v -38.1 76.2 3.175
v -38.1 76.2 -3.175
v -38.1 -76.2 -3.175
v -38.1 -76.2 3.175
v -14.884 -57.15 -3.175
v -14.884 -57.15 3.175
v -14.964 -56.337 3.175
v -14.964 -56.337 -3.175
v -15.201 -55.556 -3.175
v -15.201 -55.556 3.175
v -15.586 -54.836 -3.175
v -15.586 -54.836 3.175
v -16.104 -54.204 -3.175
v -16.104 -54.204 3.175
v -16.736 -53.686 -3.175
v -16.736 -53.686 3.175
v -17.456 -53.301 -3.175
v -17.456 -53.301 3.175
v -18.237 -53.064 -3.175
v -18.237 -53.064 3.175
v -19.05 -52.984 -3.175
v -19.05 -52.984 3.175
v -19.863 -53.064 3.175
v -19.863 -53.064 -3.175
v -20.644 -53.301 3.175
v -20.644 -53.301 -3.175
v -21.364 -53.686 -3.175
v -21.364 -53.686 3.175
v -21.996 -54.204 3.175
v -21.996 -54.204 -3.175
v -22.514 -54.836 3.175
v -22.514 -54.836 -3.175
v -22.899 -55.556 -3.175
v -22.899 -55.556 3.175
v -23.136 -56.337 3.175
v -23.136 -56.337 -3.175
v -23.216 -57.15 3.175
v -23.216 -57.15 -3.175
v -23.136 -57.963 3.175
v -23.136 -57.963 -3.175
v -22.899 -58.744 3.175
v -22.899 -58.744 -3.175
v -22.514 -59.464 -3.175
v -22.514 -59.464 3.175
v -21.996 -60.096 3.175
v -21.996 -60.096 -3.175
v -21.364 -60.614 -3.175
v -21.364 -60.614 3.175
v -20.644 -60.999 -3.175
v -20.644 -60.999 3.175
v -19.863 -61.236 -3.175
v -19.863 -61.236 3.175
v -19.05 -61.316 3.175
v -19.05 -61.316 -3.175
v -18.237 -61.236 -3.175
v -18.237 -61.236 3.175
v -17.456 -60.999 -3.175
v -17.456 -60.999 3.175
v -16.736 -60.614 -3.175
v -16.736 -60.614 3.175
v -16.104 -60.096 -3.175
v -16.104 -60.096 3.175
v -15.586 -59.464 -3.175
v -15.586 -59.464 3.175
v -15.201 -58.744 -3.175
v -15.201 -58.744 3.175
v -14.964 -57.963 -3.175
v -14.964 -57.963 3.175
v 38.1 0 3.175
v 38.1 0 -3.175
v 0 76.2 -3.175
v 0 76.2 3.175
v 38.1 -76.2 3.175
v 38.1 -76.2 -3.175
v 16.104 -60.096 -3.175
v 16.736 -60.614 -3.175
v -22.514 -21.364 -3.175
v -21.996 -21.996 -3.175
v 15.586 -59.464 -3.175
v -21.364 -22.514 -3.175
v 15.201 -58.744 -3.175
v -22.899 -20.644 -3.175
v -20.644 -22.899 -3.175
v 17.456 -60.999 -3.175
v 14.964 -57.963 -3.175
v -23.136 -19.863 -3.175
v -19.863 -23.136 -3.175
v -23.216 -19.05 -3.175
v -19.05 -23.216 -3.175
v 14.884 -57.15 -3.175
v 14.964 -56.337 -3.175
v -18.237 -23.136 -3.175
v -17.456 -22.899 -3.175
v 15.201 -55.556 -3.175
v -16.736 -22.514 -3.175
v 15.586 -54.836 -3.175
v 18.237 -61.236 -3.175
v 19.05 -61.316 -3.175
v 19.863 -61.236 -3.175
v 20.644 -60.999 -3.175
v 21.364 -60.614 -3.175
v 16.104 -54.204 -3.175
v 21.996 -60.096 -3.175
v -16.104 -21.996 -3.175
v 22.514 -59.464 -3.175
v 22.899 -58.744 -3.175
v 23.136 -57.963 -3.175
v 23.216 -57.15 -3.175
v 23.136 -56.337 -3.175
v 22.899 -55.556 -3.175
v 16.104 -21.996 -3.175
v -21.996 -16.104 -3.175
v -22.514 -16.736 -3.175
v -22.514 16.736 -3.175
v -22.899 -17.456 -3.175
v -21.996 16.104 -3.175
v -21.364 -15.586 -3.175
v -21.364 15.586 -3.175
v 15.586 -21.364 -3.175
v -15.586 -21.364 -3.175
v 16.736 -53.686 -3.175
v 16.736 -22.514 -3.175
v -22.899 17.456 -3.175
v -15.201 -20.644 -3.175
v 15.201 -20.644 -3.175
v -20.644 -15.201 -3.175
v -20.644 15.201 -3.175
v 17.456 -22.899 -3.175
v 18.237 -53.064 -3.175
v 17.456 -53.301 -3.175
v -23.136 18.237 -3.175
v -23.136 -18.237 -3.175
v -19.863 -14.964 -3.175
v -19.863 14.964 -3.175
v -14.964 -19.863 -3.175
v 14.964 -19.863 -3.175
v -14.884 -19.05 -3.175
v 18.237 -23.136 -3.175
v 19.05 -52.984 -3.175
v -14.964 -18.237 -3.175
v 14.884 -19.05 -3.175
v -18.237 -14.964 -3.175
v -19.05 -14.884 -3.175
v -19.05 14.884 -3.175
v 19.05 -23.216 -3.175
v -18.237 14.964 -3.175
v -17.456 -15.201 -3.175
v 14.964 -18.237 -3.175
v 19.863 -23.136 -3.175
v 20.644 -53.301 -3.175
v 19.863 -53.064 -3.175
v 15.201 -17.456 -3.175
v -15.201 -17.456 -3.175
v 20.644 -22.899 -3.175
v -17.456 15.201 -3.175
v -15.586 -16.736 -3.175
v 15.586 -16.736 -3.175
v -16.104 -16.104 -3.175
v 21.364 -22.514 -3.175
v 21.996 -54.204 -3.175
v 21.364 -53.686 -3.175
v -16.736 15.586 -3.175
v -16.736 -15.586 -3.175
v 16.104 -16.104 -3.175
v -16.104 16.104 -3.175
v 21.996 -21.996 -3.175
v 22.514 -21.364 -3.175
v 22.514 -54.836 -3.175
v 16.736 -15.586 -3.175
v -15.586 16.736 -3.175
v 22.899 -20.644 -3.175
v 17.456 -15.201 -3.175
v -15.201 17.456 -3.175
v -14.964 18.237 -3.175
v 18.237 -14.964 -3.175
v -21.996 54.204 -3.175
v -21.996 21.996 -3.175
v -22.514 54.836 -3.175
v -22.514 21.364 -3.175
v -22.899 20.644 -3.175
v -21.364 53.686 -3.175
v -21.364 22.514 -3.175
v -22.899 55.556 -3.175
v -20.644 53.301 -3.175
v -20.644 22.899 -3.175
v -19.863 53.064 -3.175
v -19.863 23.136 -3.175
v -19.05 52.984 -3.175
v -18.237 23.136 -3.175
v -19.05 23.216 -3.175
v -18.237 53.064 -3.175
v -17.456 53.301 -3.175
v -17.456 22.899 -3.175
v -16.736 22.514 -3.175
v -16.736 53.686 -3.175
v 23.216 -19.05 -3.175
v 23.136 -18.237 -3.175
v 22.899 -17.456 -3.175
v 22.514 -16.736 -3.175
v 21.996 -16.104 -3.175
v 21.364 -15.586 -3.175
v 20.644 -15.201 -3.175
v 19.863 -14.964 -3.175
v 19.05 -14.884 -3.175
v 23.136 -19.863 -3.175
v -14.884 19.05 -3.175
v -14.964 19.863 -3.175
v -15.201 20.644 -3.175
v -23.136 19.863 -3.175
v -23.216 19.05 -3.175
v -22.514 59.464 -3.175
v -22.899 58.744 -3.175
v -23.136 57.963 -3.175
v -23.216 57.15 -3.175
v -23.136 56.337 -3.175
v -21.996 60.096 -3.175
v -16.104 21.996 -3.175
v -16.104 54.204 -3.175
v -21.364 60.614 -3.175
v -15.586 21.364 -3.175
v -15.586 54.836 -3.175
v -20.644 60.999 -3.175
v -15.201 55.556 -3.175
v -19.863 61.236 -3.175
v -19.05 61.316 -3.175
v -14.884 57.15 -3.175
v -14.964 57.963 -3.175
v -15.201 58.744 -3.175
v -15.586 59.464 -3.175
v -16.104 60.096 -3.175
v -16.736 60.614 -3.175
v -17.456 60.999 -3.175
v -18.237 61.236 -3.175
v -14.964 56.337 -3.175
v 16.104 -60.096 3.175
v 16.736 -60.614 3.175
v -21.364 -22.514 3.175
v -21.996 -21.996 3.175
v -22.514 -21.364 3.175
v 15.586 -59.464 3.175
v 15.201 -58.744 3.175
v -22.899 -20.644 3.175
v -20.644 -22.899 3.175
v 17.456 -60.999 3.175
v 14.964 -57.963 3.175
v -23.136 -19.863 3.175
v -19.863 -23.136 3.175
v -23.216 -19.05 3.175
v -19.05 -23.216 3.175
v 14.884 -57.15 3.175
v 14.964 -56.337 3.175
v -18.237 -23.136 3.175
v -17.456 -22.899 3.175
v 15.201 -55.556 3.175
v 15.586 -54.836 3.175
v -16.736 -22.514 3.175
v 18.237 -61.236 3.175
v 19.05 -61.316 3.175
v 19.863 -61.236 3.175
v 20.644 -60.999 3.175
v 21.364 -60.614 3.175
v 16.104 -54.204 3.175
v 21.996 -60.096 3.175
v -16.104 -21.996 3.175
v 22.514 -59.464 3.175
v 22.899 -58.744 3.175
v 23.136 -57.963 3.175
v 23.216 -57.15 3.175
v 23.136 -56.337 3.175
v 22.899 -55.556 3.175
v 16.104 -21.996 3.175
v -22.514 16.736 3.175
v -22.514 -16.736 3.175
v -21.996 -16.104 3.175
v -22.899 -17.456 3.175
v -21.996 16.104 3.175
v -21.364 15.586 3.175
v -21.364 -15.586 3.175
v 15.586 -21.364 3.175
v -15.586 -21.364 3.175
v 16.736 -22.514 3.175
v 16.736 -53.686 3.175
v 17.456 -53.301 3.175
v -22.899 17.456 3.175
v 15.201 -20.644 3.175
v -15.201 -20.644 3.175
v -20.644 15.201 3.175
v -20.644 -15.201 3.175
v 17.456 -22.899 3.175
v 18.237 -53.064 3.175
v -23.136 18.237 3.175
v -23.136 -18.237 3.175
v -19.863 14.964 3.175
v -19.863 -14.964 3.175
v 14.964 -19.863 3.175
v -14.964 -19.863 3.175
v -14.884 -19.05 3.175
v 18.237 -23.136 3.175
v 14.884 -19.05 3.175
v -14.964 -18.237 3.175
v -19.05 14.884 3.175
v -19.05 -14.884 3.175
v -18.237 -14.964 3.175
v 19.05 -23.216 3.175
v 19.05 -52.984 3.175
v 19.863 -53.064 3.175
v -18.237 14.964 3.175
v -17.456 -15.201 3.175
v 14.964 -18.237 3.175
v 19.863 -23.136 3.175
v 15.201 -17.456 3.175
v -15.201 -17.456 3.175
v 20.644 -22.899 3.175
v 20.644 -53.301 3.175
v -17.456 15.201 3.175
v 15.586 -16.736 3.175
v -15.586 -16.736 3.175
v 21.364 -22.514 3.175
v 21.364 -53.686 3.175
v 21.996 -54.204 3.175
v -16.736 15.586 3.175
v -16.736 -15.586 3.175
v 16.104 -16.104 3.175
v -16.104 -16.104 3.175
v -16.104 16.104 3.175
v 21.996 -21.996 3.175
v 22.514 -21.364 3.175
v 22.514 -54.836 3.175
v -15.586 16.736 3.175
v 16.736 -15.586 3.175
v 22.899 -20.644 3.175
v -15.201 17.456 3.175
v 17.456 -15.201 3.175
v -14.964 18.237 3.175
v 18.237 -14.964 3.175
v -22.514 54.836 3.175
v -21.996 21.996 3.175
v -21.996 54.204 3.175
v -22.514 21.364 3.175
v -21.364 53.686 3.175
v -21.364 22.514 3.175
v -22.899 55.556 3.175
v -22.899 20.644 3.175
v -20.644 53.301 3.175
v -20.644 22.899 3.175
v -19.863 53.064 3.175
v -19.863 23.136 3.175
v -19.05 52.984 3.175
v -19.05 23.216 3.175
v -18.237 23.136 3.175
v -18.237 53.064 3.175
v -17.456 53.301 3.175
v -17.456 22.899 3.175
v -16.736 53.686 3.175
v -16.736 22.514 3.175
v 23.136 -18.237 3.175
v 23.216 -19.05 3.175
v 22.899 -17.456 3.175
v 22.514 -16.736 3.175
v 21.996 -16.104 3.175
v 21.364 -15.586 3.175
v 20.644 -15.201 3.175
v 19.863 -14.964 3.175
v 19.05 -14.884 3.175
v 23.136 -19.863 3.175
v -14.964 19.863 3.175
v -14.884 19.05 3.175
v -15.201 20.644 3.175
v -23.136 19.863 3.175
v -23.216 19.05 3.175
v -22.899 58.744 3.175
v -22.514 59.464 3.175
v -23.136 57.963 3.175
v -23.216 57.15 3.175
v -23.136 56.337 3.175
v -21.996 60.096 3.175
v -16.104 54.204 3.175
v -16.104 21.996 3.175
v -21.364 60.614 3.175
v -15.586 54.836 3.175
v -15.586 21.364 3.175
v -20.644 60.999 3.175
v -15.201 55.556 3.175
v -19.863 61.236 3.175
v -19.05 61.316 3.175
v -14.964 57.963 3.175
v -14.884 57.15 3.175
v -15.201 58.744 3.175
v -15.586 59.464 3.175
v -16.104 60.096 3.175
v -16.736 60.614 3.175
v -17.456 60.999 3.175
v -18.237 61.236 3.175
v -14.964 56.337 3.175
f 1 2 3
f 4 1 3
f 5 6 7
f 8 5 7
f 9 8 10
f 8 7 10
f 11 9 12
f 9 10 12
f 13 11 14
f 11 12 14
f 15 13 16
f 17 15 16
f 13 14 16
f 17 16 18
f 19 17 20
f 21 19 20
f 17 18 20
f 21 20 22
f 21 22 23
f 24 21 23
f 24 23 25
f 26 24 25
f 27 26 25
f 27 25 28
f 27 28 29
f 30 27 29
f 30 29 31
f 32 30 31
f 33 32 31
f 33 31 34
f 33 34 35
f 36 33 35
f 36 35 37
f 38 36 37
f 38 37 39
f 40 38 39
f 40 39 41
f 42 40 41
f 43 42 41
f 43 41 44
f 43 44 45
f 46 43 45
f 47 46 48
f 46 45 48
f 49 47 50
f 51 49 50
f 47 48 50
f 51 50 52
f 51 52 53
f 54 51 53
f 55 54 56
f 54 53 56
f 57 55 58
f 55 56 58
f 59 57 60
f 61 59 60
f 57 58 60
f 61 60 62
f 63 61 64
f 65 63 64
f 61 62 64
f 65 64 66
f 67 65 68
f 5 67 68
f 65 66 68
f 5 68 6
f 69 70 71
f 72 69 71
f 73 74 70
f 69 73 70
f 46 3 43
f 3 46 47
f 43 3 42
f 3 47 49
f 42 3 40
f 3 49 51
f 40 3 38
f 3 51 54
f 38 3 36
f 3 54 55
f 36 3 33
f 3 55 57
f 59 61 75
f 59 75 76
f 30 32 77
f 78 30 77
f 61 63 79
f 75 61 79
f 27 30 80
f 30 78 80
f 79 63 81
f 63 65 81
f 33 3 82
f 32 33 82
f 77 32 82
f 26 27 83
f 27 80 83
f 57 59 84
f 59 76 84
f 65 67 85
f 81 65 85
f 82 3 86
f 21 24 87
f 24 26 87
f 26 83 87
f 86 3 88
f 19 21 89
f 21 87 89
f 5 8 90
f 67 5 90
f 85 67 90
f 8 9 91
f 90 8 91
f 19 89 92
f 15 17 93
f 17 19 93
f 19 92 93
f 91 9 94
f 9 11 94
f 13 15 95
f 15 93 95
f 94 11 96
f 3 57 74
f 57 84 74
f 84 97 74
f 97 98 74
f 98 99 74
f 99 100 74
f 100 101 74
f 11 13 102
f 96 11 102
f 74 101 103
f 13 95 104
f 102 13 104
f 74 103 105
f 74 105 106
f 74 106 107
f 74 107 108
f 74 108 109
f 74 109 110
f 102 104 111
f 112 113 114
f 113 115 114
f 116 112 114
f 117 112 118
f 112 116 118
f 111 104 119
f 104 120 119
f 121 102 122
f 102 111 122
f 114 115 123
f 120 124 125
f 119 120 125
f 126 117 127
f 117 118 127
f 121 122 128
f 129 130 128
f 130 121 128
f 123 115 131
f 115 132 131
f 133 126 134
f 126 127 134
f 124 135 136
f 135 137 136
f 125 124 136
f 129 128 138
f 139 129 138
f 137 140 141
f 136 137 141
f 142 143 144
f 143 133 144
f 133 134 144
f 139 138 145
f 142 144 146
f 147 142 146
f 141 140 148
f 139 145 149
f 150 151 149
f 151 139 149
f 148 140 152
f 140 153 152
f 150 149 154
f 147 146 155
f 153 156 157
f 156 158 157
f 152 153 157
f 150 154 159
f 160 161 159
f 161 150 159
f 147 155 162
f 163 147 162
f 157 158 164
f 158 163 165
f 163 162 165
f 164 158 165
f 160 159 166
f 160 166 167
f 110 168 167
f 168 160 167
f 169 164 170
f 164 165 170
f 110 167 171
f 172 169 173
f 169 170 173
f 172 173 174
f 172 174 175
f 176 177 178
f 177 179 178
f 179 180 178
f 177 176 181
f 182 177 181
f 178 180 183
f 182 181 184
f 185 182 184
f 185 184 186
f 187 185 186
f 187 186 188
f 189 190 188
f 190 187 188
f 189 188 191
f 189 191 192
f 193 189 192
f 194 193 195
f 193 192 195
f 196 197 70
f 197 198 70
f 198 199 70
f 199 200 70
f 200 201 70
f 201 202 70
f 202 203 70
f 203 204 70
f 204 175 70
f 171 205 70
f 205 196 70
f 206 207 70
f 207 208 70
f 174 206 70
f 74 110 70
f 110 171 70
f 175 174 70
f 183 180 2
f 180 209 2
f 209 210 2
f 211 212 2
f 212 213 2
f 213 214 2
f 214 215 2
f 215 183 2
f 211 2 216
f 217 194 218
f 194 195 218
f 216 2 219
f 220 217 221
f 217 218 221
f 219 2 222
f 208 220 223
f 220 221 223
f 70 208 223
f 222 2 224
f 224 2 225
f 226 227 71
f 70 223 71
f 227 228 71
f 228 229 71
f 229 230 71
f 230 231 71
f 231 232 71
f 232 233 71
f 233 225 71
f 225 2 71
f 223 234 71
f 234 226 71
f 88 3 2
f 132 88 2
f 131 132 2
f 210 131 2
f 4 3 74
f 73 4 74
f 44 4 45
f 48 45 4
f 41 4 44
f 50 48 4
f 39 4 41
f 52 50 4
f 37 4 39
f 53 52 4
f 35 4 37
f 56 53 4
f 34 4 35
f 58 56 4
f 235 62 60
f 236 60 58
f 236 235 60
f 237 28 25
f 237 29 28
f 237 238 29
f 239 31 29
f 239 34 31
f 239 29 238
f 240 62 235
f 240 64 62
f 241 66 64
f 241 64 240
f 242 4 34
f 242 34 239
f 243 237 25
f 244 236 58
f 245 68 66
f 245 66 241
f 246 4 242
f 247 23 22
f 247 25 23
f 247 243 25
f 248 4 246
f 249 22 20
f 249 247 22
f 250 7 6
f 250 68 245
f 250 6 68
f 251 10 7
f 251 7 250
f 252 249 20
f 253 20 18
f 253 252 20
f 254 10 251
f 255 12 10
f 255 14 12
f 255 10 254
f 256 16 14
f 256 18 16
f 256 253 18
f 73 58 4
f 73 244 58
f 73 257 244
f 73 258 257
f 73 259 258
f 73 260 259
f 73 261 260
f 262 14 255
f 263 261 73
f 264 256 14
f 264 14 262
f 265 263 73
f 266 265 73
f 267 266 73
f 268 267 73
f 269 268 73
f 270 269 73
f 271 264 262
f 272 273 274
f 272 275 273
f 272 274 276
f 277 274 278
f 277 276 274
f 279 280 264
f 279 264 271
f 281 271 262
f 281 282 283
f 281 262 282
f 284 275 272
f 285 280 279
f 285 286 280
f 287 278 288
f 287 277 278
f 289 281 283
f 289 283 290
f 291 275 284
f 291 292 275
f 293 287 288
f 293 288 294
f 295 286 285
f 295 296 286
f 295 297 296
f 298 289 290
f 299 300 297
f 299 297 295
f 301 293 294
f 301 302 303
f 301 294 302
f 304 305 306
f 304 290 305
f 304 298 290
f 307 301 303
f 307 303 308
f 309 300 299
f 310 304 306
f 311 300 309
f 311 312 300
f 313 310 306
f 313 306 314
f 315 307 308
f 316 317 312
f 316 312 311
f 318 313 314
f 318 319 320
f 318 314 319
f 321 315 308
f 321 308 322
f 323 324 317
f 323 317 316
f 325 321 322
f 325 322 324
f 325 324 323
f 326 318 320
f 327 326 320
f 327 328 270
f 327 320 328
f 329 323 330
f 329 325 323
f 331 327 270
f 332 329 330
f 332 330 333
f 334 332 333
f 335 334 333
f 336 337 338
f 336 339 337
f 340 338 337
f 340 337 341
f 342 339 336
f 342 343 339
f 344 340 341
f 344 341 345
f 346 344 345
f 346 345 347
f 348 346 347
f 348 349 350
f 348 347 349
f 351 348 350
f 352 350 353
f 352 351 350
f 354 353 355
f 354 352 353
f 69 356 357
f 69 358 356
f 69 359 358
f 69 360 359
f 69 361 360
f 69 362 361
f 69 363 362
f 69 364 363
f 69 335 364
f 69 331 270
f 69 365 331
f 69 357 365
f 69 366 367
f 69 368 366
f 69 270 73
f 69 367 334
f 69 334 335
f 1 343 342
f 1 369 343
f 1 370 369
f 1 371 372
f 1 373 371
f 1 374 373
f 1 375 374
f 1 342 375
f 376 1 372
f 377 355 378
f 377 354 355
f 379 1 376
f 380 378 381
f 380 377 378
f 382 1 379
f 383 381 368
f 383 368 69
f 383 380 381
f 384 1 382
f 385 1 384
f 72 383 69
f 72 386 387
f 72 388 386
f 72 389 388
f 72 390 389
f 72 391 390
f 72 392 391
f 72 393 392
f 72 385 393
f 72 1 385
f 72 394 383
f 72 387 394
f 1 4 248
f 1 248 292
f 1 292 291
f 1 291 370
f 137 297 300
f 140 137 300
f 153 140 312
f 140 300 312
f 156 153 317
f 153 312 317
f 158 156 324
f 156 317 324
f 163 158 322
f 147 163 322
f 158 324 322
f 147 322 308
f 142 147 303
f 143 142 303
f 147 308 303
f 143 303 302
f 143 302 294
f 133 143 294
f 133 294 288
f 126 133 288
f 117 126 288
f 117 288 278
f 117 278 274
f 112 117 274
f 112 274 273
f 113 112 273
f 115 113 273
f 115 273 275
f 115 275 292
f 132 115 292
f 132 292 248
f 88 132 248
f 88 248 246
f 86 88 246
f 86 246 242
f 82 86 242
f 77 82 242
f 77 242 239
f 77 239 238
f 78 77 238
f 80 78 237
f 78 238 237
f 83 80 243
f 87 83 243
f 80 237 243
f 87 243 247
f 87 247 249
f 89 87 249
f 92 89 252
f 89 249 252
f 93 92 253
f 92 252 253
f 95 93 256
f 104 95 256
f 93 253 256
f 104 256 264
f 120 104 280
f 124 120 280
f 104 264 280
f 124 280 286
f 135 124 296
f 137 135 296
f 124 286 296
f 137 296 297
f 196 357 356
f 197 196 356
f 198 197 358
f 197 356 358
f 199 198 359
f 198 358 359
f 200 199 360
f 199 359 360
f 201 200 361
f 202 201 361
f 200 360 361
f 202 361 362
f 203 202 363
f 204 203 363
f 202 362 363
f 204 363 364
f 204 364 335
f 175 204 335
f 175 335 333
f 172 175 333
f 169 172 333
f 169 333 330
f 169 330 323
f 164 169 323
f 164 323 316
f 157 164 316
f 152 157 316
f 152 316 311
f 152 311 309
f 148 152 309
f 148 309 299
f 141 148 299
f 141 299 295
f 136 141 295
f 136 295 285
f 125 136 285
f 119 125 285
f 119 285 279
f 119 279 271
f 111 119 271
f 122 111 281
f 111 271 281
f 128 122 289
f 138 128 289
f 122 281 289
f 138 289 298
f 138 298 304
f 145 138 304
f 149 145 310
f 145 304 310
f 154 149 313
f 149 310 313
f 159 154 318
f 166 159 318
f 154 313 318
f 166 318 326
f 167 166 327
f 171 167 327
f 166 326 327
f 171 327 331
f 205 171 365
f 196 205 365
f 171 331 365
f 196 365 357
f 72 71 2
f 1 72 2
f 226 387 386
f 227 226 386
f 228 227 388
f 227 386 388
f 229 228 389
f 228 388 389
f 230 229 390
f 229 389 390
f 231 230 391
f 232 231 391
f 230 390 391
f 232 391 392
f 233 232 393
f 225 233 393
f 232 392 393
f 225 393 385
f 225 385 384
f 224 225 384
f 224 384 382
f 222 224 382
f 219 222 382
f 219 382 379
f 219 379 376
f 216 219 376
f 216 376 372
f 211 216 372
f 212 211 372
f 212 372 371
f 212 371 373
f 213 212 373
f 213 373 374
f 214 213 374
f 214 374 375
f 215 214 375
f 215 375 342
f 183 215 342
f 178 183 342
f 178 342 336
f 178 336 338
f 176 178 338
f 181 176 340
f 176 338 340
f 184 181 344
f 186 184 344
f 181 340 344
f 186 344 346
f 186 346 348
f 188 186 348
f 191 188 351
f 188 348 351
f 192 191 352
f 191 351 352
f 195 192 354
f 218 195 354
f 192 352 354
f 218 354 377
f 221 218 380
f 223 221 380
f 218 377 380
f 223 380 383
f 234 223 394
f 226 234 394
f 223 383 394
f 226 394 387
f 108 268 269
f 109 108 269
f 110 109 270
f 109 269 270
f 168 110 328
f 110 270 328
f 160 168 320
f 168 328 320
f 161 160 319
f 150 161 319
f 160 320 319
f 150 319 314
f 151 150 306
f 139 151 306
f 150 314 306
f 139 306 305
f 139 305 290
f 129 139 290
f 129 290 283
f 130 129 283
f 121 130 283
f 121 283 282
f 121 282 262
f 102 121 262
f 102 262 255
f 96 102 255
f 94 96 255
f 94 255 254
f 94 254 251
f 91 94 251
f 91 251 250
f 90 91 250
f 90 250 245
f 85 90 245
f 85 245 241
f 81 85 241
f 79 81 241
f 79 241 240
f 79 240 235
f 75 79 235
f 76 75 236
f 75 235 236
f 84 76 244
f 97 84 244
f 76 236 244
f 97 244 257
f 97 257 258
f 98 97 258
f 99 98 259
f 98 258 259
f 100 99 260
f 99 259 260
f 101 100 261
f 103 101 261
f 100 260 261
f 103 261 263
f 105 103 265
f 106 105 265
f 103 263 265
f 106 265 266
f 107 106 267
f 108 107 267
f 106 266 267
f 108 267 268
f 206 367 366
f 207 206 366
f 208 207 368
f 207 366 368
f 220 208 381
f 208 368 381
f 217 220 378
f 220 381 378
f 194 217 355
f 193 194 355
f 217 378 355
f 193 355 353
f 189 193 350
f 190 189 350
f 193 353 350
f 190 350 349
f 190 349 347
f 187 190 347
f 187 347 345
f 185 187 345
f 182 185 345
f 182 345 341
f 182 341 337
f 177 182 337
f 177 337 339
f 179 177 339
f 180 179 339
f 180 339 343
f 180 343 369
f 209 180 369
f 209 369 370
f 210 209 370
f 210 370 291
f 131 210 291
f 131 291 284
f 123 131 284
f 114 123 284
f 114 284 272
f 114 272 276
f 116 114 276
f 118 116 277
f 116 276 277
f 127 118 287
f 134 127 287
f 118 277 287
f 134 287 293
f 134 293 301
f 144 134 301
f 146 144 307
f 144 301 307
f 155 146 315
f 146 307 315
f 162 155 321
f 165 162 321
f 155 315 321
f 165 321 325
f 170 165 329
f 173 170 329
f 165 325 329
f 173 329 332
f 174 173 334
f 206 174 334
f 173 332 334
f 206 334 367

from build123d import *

# Parameters (mm, degrees)
BOSS_EXTRUDE1_DEPTH      = 3.175
BOSS_EXTRUDE1_DEPTH_BACK = 3.175
SKETCH4_R                = 4.1656
CUT_EXTRUDE1_DEPTH       = 86.430512699


with BuildPart() as part:
    # Sketch3 → Boss-Extrude1 (new, two sides: drawn at the far end of the back side and taken through both)
    with BuildSketch(Plane.XY.offset(-BOSS_EXTRUDE1_DEPTH_BACK)):
        Polygon((0, 76.2), (-38.1, 76.2), (-38.1, -76.2), (38.1, -76.2), (38.1, 0), align=None)
    extrude(amount=BOSS_EXTRUDE1_DEPTH + BOSS_EXTRUDE1_DEPTH_BACK)

    # Sketch4 → Cut-Extrude1 (cut, through all)
    with BuildSketch(Plane.XY.offset(3.175)):
        with Locations((-19.05, -57.15)):
            Circle(SKETCH4_R)
        with Locations((19.05, -57.15)):
            Circle(SKETCH4_R)
        with Locations((19.05, -19.05)):
            Circle(SKETCH4_R)
        with Locations((-19.05, -19.05)):
            Circle(SKETCH4_R)
        with Locations((-19.05, 19.05)):
            Circle(SKETCH4_R)
        with Locations((-19.05, 57.15)):
            Circle(SKETCH4_R)
    extrude(amount=-CUT_EXTRUDE1_DEPTH, mode=Mode.SUBTRACT)


solid = part.part
